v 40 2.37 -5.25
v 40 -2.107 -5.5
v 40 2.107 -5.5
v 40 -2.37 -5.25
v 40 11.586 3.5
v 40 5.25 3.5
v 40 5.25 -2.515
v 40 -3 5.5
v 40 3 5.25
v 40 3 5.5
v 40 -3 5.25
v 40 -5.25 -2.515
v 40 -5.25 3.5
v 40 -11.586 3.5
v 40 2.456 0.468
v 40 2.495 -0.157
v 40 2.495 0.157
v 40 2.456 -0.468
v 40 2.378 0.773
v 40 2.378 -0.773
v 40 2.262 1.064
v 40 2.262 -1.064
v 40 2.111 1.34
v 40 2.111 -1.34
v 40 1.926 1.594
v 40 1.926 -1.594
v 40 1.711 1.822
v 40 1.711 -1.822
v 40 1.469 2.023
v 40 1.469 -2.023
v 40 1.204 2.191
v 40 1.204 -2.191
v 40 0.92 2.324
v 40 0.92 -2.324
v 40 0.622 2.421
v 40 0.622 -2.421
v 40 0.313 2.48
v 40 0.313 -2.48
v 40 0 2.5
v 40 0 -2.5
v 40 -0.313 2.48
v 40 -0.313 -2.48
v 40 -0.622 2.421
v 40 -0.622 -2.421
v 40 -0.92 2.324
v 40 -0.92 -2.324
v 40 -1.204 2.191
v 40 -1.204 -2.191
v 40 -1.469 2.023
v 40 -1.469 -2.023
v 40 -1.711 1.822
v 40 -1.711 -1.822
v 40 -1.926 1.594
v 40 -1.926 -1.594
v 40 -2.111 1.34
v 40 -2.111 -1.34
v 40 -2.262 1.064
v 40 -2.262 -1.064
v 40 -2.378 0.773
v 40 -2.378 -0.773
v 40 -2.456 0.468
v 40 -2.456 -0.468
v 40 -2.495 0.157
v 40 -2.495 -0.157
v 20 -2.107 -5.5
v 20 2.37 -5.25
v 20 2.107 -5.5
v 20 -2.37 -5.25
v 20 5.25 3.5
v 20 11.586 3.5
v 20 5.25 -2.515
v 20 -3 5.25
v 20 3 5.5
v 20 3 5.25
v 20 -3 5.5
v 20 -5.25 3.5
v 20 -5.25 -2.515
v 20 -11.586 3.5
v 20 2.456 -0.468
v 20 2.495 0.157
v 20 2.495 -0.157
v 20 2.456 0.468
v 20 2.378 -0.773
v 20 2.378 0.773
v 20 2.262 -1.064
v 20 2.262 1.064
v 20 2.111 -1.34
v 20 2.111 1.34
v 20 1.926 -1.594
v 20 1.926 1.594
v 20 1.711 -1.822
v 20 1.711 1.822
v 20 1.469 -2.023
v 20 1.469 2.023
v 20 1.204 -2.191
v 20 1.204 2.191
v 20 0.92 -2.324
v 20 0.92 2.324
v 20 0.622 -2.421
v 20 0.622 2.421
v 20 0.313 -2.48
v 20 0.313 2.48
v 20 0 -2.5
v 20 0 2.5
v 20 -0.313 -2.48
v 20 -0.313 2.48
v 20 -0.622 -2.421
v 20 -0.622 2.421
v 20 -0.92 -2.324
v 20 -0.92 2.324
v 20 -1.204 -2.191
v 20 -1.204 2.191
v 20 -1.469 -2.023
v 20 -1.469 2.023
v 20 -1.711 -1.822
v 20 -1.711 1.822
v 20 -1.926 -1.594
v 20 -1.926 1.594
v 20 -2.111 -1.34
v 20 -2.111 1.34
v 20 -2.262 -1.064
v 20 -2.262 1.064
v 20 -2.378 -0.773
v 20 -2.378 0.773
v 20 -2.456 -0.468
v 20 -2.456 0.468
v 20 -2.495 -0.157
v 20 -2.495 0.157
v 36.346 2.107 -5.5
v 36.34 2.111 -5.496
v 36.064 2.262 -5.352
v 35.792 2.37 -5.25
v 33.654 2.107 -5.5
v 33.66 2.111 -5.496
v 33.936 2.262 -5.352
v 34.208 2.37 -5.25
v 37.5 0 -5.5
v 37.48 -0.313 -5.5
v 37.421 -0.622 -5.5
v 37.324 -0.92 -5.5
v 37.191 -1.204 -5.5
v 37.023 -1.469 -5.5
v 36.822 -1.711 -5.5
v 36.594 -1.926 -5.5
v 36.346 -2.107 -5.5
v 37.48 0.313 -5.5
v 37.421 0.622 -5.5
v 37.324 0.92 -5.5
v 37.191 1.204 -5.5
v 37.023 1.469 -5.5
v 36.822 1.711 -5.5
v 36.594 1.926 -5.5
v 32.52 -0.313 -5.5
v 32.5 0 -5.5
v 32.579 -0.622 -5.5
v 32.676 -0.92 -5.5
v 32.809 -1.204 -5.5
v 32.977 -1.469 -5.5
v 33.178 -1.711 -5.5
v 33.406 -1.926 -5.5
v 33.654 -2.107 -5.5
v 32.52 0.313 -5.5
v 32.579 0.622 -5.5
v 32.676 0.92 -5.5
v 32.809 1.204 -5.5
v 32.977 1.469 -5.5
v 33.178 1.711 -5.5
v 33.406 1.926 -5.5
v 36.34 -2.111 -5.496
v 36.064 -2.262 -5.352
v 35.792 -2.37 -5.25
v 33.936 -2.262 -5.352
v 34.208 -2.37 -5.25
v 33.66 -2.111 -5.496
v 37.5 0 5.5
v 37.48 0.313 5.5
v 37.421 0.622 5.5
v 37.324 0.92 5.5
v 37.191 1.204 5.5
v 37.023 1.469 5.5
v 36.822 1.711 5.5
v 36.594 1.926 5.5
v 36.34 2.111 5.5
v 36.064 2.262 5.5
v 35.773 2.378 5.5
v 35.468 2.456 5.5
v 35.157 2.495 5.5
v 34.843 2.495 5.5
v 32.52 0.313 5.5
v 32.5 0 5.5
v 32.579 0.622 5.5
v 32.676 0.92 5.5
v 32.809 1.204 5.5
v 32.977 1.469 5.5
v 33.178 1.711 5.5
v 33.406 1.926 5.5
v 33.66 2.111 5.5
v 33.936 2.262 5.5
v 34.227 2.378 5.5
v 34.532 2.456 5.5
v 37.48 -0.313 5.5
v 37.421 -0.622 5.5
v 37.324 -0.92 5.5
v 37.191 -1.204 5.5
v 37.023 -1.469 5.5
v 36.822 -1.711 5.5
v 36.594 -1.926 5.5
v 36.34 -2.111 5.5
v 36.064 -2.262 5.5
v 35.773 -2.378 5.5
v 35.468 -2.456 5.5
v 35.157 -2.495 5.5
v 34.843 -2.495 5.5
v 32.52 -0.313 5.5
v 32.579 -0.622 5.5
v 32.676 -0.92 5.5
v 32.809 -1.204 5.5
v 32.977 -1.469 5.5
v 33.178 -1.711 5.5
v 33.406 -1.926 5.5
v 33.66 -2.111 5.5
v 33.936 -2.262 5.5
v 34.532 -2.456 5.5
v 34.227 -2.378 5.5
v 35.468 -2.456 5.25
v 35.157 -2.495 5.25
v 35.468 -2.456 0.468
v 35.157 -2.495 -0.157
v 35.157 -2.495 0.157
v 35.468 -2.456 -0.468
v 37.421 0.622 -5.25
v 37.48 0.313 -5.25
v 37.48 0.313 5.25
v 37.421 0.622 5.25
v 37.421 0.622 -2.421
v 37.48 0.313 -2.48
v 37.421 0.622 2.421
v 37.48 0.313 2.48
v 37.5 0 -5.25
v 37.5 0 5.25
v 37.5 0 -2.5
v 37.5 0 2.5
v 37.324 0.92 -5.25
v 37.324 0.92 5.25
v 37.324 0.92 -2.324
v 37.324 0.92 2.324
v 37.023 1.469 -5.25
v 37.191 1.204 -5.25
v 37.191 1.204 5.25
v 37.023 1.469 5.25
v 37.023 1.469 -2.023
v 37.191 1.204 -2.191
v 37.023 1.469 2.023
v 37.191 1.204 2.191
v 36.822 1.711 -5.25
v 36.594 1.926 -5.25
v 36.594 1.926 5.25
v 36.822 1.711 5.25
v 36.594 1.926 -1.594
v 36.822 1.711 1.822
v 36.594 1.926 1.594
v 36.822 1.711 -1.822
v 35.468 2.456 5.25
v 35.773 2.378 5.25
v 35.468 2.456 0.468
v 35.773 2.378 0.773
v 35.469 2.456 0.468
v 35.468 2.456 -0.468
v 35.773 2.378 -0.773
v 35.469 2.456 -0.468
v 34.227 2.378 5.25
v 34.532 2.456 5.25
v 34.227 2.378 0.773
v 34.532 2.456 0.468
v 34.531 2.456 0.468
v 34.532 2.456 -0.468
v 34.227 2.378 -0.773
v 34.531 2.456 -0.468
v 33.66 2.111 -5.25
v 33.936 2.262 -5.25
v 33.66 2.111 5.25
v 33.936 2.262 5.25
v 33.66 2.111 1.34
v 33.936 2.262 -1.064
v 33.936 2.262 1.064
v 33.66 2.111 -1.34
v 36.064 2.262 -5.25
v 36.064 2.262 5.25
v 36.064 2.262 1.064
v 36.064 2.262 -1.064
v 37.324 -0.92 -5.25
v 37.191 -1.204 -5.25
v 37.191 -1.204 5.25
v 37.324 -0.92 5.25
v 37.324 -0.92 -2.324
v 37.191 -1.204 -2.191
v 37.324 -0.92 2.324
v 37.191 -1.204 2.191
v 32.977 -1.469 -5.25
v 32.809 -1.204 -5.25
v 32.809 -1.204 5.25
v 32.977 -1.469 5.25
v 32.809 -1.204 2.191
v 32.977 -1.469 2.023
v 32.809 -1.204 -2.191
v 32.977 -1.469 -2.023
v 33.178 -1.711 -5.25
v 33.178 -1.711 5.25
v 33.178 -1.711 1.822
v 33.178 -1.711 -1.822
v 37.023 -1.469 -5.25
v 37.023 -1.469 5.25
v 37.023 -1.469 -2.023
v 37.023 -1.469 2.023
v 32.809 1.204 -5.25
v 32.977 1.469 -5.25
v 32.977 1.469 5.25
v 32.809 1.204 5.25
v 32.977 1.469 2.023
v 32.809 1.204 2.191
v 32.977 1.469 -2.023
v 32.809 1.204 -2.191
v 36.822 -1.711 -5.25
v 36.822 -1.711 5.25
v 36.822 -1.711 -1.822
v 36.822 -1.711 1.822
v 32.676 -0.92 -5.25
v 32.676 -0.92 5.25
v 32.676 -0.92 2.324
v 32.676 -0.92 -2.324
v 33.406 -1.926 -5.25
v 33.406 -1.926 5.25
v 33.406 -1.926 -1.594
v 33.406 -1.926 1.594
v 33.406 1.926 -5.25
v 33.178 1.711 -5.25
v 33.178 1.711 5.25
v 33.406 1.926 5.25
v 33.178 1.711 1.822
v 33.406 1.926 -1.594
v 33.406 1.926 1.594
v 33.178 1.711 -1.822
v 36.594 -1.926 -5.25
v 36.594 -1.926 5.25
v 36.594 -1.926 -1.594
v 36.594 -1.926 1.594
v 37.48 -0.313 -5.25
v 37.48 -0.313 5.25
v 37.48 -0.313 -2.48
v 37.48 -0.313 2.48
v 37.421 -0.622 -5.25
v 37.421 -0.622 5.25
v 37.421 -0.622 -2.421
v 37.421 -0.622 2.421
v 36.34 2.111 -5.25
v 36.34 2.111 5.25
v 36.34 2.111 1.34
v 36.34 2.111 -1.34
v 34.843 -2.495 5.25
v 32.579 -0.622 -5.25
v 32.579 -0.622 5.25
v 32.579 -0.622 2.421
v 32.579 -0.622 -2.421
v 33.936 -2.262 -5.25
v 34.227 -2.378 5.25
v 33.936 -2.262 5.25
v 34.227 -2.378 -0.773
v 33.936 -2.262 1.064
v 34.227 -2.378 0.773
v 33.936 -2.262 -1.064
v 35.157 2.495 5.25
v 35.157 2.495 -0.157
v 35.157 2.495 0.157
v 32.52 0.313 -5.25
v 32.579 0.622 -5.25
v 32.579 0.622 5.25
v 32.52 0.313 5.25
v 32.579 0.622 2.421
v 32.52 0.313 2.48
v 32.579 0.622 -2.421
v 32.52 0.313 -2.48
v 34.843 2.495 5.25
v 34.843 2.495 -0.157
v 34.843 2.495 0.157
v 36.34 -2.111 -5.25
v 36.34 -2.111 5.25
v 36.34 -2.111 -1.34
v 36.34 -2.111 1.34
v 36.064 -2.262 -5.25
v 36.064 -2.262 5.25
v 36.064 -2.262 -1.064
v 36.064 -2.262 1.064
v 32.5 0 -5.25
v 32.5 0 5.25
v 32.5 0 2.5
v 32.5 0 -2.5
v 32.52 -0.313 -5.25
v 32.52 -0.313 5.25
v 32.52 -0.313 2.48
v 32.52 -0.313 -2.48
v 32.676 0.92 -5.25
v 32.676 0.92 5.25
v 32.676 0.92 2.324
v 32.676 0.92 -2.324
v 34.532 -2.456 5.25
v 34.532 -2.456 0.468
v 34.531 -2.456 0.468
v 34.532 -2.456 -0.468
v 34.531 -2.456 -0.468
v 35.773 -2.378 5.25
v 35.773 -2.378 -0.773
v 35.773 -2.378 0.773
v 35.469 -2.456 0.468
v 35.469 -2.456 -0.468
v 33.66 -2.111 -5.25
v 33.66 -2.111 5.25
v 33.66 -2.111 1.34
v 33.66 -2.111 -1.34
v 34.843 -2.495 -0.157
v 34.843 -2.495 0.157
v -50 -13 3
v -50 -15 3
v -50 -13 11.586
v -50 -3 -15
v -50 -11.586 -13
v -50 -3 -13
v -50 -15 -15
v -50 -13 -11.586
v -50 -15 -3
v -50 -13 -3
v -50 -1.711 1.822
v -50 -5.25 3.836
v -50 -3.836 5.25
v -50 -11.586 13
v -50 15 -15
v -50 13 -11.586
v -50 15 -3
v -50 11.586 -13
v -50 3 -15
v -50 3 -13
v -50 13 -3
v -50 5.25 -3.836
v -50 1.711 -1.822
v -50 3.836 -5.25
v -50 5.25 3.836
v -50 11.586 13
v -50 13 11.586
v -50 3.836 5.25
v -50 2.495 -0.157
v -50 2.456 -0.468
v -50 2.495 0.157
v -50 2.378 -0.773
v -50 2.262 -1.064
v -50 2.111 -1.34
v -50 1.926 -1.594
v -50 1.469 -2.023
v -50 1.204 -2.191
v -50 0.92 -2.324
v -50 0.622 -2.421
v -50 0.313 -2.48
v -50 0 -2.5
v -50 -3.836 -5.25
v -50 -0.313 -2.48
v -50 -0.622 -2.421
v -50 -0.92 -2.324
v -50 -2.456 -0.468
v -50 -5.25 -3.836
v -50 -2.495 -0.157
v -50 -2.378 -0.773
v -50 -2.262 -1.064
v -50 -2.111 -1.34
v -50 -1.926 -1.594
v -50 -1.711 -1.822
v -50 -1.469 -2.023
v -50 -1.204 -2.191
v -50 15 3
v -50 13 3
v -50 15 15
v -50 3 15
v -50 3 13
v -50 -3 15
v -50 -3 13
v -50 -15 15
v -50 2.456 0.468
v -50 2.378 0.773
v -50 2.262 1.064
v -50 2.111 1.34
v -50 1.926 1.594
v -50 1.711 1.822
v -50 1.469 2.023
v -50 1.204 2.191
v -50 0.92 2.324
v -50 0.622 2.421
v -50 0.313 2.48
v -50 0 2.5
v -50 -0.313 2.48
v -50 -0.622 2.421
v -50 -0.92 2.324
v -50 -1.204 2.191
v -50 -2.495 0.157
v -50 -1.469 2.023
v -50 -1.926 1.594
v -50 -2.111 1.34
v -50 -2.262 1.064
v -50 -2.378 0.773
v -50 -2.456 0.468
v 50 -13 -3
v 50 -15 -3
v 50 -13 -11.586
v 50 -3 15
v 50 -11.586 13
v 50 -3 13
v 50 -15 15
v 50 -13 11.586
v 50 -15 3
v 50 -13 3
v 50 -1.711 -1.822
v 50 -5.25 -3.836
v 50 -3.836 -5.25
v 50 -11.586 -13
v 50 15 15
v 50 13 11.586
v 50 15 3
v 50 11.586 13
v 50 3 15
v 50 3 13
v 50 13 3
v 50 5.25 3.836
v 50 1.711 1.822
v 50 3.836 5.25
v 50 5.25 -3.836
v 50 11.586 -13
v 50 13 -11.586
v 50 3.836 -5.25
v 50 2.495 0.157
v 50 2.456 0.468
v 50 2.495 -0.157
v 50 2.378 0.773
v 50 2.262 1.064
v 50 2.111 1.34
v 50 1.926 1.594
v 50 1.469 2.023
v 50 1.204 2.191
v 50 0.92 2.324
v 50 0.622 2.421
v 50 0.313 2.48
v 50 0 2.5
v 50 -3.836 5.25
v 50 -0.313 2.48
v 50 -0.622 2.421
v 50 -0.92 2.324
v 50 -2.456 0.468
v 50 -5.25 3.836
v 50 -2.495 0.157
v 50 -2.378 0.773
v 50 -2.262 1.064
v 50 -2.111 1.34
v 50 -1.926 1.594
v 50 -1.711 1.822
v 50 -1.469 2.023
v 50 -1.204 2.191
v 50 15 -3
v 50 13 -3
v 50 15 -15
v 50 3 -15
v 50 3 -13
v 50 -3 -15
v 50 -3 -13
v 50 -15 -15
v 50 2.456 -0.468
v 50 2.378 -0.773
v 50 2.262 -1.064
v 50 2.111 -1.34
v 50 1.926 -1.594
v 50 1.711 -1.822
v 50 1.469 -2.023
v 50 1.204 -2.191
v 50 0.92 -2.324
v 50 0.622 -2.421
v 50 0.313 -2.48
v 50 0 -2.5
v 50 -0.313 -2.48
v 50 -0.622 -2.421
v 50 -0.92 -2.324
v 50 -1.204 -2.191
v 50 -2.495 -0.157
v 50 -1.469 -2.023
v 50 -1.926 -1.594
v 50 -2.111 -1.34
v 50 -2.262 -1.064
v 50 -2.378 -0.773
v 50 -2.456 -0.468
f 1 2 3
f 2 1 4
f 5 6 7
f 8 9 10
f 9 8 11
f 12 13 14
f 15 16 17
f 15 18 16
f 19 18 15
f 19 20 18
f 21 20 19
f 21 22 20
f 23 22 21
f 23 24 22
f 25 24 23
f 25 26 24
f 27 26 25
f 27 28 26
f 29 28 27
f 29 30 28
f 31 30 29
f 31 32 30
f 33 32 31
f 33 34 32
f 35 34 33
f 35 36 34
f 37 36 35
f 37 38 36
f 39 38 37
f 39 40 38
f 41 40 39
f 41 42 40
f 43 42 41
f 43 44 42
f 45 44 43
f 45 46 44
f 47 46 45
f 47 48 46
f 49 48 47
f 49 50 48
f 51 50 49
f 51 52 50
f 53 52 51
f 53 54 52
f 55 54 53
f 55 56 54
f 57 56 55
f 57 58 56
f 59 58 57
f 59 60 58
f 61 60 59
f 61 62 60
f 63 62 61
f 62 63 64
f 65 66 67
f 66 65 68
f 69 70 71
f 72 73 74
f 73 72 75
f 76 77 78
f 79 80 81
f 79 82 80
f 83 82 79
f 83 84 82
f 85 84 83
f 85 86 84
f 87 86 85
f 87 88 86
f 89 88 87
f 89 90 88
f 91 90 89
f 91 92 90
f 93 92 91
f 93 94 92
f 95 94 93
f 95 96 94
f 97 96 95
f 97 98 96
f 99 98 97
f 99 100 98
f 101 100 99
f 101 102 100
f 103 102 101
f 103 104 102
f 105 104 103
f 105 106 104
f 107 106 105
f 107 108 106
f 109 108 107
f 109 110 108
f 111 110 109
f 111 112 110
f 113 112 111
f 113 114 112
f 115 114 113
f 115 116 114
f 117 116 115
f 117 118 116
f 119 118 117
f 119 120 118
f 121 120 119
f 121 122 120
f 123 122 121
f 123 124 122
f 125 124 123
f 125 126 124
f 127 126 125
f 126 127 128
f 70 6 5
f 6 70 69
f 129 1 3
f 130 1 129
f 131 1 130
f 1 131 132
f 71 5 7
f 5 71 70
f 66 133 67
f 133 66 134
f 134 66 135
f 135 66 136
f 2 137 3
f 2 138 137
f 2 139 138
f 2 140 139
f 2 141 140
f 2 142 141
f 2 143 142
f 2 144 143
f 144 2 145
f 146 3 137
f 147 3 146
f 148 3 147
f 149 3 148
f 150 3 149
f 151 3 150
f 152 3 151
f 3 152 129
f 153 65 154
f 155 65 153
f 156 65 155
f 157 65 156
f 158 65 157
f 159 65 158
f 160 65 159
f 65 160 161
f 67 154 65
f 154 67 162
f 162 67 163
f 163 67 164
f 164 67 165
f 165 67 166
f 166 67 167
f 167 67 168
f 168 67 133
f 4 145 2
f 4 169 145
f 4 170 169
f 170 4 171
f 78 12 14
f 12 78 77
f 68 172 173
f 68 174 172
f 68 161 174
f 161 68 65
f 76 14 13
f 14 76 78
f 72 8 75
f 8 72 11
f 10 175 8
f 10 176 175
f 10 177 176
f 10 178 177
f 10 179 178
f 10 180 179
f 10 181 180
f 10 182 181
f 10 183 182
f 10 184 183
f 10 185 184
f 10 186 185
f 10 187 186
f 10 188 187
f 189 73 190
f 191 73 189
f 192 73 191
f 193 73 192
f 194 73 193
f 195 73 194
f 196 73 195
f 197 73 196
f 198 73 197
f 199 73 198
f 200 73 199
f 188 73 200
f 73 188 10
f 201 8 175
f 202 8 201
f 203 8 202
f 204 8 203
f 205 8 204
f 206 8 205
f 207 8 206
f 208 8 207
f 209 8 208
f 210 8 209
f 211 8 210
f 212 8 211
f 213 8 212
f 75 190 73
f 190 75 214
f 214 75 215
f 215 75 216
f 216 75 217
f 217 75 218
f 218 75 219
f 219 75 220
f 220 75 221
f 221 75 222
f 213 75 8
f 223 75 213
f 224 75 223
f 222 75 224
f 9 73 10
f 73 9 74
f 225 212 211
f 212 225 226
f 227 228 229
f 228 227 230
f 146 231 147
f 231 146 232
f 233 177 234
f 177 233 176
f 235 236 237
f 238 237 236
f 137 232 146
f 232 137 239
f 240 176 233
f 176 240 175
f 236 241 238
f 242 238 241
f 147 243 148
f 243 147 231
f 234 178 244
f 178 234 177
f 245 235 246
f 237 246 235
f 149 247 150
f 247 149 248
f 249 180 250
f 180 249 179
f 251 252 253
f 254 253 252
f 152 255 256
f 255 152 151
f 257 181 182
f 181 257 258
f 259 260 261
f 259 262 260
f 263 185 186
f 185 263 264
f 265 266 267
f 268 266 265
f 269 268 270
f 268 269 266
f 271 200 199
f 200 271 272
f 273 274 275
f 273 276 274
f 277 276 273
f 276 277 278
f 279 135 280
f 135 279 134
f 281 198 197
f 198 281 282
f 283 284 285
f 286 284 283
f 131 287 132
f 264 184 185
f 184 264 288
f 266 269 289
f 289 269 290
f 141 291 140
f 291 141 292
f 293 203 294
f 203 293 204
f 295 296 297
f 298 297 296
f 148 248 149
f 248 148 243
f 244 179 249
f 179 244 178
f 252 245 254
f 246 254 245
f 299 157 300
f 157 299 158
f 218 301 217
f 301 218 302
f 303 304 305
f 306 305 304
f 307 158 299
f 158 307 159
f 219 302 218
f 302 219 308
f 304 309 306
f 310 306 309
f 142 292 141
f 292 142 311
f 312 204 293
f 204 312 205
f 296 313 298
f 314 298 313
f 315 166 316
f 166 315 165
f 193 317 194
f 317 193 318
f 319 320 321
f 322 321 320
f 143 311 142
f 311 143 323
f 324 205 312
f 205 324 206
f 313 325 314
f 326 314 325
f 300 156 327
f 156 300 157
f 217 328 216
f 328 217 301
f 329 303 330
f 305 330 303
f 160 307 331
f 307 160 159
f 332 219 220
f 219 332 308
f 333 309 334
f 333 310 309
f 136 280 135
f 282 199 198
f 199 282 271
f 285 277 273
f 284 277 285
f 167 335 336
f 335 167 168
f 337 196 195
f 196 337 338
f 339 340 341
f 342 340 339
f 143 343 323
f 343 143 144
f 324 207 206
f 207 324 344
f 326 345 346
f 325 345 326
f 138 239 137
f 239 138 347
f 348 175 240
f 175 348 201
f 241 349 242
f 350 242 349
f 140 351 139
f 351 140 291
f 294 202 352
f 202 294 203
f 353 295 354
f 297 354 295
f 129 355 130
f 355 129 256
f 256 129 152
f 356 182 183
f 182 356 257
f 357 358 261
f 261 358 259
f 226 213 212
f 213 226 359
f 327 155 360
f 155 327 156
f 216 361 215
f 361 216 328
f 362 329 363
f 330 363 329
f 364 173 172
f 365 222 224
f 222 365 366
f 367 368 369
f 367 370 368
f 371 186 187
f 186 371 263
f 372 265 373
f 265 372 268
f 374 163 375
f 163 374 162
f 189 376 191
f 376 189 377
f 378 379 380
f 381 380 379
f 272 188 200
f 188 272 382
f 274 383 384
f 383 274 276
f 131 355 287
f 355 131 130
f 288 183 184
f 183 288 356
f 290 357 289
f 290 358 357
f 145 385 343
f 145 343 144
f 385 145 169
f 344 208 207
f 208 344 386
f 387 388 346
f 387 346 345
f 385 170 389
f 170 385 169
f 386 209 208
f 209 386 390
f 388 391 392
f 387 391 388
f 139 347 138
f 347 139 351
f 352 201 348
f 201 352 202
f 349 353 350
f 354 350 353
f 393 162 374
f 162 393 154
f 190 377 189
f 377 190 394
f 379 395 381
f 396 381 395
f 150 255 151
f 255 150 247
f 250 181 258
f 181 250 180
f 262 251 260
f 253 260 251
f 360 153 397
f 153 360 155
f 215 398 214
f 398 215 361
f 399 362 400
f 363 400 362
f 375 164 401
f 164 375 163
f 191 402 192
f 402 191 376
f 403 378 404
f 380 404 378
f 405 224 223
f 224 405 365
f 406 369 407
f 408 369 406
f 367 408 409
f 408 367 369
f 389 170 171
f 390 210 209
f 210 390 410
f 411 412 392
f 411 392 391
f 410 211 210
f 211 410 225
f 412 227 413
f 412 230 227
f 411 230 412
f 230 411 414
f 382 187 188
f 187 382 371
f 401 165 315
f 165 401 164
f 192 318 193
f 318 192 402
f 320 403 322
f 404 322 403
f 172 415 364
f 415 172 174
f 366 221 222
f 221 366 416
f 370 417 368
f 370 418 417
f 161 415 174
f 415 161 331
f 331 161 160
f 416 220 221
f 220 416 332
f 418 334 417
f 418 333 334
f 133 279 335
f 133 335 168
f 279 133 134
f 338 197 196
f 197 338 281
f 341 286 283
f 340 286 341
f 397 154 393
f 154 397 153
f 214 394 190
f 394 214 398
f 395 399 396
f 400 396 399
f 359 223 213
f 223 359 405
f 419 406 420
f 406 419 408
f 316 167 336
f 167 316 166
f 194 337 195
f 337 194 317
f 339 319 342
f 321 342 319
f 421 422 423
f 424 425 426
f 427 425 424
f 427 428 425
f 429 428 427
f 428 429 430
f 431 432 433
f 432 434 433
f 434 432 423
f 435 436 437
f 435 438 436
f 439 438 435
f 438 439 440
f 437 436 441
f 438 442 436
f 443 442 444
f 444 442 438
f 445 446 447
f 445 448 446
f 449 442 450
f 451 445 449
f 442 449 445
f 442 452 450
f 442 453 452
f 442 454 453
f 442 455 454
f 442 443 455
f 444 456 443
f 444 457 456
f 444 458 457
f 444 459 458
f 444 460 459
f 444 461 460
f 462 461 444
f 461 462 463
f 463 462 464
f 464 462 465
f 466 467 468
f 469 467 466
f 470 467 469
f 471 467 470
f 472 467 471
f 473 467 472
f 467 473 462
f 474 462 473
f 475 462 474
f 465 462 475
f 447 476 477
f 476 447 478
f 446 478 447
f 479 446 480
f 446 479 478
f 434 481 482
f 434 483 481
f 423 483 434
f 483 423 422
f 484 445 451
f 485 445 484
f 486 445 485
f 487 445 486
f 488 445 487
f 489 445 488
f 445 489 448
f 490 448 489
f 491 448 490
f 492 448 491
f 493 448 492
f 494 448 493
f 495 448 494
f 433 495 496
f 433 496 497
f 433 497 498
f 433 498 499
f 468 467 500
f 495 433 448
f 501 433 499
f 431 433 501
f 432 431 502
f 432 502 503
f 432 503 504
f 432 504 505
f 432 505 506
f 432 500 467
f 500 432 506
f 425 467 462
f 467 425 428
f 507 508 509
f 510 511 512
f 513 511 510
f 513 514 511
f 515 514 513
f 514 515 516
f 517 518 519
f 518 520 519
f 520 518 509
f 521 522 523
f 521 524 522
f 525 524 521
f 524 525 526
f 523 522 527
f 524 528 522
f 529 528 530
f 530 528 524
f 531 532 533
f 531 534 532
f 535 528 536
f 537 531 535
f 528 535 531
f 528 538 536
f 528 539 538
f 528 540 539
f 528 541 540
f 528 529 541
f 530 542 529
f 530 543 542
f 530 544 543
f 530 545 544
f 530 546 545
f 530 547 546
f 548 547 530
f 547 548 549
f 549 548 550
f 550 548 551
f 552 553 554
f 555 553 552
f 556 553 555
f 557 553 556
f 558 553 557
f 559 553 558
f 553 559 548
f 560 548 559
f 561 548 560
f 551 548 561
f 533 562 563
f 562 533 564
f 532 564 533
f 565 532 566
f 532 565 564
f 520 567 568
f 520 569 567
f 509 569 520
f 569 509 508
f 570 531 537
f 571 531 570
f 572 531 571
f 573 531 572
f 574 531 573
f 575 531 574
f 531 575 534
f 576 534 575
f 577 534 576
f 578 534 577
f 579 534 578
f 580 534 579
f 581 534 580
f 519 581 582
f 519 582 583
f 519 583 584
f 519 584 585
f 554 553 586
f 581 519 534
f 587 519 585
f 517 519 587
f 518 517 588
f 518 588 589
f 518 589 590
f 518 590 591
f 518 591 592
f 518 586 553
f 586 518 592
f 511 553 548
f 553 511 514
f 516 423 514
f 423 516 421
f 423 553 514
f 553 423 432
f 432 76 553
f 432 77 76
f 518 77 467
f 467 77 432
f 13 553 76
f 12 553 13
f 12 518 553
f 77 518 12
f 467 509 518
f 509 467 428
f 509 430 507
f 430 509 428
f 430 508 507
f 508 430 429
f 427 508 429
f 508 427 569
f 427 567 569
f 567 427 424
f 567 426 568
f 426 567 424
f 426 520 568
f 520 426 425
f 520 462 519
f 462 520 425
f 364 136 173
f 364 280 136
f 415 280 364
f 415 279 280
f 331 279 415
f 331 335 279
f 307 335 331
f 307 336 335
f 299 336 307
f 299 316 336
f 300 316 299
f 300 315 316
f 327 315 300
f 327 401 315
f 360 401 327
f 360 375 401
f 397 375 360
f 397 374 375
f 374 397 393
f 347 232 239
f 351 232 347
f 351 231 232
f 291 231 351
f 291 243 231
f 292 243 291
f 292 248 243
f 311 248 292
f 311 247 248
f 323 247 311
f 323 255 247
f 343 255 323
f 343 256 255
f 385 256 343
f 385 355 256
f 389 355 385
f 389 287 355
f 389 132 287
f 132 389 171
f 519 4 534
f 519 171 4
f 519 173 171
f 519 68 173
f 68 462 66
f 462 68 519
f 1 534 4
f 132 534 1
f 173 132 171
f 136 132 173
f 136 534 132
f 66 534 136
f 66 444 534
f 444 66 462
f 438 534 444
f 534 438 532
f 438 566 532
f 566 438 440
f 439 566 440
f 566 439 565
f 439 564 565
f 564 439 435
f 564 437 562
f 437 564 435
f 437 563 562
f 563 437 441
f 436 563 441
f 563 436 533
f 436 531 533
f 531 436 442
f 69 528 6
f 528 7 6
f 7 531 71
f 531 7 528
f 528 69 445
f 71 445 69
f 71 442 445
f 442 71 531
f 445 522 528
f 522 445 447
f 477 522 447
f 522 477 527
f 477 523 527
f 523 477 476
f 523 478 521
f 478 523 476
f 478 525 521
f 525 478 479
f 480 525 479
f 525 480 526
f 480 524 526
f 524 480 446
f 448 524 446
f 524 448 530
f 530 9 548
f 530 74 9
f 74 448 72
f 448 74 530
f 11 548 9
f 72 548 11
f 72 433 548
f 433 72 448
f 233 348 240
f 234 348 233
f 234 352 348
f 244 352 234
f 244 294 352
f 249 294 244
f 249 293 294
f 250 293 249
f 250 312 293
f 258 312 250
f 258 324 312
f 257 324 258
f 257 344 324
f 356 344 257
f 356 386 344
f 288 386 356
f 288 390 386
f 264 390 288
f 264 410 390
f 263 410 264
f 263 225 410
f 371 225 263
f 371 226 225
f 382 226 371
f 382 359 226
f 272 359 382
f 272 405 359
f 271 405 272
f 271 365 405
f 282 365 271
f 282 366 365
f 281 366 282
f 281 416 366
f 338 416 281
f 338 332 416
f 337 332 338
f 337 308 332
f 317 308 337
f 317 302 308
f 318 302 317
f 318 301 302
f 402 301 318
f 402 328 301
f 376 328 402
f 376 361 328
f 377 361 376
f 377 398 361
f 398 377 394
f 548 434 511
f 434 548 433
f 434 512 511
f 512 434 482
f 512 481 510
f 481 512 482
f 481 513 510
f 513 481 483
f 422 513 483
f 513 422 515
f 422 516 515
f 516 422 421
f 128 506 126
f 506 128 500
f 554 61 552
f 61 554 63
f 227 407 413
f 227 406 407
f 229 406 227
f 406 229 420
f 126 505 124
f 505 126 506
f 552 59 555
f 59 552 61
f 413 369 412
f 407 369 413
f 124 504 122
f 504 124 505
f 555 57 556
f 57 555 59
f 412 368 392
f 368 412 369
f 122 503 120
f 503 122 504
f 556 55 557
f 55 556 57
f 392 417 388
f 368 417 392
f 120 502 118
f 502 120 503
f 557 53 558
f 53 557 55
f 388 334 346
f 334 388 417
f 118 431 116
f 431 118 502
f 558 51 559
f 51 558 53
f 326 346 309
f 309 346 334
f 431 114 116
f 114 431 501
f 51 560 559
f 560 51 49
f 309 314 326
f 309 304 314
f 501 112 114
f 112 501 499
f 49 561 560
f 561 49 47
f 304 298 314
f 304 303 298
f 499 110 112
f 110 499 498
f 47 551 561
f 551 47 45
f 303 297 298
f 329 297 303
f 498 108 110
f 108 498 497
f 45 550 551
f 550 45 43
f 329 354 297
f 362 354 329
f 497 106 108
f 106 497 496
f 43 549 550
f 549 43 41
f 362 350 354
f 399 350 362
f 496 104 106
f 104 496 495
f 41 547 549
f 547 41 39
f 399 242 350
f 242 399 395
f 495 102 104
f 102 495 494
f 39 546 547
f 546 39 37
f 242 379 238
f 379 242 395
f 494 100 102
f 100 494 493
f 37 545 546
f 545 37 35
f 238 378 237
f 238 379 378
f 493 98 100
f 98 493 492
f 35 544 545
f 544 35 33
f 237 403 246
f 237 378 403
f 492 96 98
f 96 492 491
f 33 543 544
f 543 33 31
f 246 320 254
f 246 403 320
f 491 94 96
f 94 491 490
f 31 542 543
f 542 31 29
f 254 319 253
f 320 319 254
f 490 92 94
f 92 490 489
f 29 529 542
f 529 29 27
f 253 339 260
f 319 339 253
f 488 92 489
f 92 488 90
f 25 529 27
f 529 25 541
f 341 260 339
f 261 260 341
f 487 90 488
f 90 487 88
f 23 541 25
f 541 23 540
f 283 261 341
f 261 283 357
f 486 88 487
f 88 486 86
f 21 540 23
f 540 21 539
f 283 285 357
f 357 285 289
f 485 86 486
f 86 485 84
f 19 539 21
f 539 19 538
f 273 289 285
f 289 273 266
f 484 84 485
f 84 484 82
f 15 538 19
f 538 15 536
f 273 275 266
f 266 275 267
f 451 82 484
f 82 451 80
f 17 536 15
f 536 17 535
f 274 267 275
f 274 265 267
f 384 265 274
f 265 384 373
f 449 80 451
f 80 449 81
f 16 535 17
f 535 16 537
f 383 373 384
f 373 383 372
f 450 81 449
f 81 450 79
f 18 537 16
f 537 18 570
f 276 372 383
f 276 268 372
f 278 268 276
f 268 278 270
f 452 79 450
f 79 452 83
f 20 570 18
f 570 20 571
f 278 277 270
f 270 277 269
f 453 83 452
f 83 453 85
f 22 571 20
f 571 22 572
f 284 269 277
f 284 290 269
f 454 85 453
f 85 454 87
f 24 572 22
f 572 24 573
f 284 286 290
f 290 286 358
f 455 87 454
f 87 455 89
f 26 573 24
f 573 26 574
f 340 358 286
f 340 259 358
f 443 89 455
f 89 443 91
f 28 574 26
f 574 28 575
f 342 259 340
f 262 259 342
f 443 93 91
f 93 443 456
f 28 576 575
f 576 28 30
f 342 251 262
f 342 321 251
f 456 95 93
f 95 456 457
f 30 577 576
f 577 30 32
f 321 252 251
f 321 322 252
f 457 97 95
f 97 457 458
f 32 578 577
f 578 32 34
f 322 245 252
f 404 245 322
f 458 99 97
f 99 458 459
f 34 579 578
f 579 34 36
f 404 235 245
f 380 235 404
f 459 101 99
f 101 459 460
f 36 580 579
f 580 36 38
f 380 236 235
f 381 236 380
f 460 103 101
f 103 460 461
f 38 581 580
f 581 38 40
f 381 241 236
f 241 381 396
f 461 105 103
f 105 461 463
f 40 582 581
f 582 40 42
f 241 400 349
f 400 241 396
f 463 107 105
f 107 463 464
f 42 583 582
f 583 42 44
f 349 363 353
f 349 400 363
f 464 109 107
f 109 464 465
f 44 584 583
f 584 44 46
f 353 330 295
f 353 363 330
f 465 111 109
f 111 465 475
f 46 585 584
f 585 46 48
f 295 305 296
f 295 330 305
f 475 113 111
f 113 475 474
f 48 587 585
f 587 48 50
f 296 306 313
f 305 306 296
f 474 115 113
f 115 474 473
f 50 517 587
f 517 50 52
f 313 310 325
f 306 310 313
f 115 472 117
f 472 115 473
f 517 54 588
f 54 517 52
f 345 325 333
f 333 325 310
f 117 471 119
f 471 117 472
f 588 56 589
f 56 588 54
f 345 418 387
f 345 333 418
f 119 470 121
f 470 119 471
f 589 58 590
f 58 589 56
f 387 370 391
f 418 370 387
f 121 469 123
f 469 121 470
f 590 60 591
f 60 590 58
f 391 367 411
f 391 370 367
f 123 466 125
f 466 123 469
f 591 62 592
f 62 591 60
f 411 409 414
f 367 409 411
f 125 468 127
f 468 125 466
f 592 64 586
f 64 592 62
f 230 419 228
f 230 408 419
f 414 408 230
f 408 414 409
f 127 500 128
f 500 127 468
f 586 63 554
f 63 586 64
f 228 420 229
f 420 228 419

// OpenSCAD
//(C) Nathan Zadoks 2011
//CC-BY-SA or GPLv2, pick your poison.
//modified 2014-11-03 by Amran Anjum (amx109) to make sure the tslot is centered on X/Y/Z
//further modified to restore my sanity

$fn=50;

//			size, length, sheet thickness, 'gap', center hole dia, centre cube width
tslot_20 = [20, 0, 1.8, 5, 4.3, 7.3];
tslot_30 = [30, 0, 2, 6, 5, 10.5];
tslot_8x30 = [40, 0, 2, 8, 7, 10.8];

module tslot(size, length)
{
	echo(str("Item: T-Slot size ", size, "mm Length: ", length, "mm"));
	
	if(size == 20)
		_tslot(tslot_20+[0,length,0,0,0,0]);
	if(size == 30)
		_tslot(tslot_30+[0,length,0,0,0,0]);
	if(size == "8x30")
		_tslot(tslot_8x30+[0,length,0,0,0,0]);
}

module tslot_nut(size, M)
{
	echo(str("Item: T-Slot Nut keyed ", size, "mm M",M," thread"));
	
	if(size == 30)
		_tslot_nut(tslot_30+[0,20,0,0,0,0],M);
	if(size == "8x30")
		_tslot_nut(tslot_8x30+[0,20,0,0,0,0],M);
}
module _tslot(dims)
{
	size=dims[0];		//size of each side
	length=dims[1];		//length. descriptive enough, no?
	thickness=dims[2];	//thickness of the 'sheet'
	gap=dims[3];		//gap, thickness of the lower part of the 'T'
	center_r = dims[4];
	center_cube = dims[5];
	
	start=thickness/sqrt(2);
	
	color([0.5,0.5,0.5])
	render()
	rotate([0,90,0])
	translate([0,0,-length/2])
		linear_extrude(height=length)
			difference()
			{
				union()
				{
					for(d=[0:3]) rotate([0,0,d*90]) polygon(points=[
						[0,0],
						[0,start],
						[size/2-thickness-start,size/2-thickness],
						[gap/2,size/2-thickness],[gap/2,size/2],
						[size/2,size/2],
						[size/2,gap/2],
						[size/2-thickness,gap/2],
						[size/2-thickness,size/2-thickness-start],
						[start,0]
					]);
					square(center_cube,center=true);
				}
				
				circle(r=center_r/2,center=true);
			}
	
}

module _tslot_nut(dims,M)
{
	size=dims[0];		//size of each side
	length=dims[1];		//length. descriptive enough, no?
	thickness=dims[2];	//thickness of the 'sheet'
	gap=dims[3];		//gap, thickness of the lower part of the 'T'
	
	start=thickness/sqrt(2);
	
	render()
		difference()
		{
			rotate([-90,0,90])
			translate([-size/2,-(size/2-(gap+thickness)/2)/2,-length/2]) 
			linear_extrude(height=length)
				intersection(){
					polygon([	[size/2-gap/2,0],
								[size/2-gap/2,thickness],
								[thickness+start,thickness],
								[size/2,size/2-2],
								[size-thickness-start,thickness],
								[size/2+gap/2,thickness],
								[size/2+gap/2,0]]);
					square([size,size/2-(gap+thickness)/2]);
				}
			translate([length/4,0,0]) cylinder(d=M, h=length+2, $fn=50, center=true);
		}
}

tslot(30, 100);
translate([30,0,0]) tslot_nut(30, 5); 
